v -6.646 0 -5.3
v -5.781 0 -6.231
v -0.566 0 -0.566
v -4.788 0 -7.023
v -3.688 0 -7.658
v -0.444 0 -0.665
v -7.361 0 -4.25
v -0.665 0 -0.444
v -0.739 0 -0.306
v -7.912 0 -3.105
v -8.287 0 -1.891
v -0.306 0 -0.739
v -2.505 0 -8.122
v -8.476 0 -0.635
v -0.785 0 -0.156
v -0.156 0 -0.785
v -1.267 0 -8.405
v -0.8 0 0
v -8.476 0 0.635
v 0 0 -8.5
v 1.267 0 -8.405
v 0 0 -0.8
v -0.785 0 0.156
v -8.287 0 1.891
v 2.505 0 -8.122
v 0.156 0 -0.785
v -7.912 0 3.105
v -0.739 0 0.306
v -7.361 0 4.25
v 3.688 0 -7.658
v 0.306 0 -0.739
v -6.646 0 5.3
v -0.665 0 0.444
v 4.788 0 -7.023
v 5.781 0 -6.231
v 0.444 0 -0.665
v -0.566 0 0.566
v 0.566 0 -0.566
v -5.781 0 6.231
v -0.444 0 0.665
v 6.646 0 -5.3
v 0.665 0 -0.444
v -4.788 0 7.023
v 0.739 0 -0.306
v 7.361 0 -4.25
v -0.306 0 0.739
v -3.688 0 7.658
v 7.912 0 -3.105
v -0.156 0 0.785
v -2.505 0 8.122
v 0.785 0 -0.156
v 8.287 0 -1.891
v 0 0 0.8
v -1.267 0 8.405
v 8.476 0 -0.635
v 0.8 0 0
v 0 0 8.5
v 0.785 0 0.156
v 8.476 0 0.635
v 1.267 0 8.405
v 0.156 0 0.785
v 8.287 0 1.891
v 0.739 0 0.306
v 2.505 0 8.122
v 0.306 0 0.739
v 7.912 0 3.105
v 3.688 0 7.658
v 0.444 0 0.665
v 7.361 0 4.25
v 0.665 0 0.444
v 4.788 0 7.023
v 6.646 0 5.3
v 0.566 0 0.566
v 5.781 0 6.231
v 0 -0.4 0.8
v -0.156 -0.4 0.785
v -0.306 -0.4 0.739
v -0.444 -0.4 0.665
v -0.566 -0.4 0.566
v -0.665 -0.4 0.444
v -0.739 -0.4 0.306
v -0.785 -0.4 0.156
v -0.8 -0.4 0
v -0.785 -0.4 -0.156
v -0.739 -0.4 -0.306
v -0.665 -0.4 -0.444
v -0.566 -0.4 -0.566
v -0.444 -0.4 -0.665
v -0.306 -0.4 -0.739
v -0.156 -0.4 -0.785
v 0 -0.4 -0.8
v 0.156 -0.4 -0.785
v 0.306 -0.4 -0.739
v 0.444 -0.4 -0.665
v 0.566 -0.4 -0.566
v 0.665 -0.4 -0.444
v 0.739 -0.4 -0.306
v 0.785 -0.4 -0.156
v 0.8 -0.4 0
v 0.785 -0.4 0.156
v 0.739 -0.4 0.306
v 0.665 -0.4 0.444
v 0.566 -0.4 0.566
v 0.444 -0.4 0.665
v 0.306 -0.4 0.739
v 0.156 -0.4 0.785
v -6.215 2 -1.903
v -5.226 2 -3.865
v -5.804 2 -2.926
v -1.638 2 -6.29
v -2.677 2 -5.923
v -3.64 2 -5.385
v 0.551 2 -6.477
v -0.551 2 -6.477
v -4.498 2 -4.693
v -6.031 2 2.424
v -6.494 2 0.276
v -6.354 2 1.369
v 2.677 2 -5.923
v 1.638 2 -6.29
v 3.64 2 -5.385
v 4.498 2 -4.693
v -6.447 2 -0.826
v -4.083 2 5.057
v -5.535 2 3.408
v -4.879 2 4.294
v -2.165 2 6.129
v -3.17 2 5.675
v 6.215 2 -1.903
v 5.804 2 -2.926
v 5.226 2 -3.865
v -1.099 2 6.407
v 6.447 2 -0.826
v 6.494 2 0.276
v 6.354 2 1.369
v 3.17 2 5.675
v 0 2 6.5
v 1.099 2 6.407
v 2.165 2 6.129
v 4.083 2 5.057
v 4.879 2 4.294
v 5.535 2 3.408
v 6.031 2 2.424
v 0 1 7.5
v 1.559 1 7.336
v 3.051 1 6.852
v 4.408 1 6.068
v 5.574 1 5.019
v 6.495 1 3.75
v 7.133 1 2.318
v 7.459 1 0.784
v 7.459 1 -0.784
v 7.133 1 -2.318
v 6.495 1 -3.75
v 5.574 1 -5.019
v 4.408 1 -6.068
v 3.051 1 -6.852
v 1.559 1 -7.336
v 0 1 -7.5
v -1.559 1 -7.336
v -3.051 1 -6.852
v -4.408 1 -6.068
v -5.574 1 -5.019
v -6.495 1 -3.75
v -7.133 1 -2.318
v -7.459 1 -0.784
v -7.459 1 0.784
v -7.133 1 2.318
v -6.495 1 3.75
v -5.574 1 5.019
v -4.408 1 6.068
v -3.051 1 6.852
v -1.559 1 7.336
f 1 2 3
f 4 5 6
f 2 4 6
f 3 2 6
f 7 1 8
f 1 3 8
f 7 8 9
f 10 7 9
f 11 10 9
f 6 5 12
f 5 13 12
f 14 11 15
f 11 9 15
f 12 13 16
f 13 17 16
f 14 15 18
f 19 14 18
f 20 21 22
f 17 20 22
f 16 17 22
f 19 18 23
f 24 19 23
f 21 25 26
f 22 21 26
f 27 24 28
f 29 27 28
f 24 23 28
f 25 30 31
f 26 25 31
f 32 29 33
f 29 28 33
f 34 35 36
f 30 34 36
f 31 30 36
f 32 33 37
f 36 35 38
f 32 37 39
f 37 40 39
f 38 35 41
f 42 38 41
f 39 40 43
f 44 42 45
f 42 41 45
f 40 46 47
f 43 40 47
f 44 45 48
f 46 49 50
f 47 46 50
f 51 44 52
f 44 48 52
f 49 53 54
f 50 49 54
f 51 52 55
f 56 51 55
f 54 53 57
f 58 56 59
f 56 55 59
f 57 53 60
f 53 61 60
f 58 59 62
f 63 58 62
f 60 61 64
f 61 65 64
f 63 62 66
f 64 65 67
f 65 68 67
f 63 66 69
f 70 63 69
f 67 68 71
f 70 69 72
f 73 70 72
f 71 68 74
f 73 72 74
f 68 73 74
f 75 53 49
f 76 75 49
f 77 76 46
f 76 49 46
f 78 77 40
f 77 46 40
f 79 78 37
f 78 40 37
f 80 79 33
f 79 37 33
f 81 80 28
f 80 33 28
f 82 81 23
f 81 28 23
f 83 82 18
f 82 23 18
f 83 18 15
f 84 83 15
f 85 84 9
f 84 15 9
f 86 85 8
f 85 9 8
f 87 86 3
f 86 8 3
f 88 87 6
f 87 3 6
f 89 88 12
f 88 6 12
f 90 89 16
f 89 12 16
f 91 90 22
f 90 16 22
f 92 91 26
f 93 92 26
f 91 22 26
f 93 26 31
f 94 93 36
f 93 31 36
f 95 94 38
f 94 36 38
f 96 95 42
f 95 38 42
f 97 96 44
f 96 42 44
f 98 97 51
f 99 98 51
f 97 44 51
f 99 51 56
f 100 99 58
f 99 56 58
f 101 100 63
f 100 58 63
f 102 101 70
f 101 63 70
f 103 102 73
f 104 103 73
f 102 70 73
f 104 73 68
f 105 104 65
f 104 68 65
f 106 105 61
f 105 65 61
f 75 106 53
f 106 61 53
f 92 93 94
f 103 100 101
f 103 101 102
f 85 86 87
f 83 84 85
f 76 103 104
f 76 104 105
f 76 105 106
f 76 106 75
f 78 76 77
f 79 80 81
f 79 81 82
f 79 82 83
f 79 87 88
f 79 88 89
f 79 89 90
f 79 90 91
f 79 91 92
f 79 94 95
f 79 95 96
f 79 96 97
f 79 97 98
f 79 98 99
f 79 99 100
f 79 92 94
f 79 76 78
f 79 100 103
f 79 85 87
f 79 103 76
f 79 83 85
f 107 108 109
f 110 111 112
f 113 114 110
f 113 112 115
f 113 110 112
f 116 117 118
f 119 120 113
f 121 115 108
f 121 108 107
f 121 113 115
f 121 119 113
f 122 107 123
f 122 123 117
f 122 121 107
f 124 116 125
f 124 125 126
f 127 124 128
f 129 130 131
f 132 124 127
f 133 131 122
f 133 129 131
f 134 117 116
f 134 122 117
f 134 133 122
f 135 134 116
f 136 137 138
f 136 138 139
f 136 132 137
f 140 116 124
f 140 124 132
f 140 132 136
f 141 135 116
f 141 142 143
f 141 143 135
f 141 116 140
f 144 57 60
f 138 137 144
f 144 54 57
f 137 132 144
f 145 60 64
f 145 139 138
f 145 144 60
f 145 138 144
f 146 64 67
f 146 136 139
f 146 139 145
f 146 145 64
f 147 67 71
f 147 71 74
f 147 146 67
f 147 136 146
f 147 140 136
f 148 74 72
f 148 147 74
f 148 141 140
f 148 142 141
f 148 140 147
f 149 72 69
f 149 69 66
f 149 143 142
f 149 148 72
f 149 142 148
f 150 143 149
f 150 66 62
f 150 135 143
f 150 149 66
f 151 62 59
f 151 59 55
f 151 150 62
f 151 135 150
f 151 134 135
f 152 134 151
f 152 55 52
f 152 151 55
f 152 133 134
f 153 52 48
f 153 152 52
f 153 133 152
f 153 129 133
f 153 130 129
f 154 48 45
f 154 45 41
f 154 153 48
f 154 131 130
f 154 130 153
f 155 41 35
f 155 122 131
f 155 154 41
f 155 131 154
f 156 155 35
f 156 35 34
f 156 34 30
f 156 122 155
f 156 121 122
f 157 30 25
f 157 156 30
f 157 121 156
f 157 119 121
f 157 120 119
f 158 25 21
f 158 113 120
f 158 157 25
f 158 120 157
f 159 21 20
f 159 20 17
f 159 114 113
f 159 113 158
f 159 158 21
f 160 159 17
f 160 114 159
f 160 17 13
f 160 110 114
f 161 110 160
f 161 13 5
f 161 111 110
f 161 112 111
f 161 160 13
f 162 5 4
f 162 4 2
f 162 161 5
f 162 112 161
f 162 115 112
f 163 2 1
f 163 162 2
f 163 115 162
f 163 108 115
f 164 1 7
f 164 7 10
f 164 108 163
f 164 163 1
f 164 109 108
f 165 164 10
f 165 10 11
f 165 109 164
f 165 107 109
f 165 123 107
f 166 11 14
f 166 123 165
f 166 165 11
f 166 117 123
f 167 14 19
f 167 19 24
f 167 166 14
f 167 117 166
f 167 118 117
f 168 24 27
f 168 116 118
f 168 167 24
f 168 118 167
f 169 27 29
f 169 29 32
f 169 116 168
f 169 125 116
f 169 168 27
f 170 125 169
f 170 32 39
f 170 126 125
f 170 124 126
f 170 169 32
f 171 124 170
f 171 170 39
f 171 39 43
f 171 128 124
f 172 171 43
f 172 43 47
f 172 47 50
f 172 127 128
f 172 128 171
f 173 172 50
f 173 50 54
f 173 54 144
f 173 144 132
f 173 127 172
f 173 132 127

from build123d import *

# Parameters (mm, degrees)
SKETCH1_R           = 8.5
BOSS_EXTRUDE1_DEPTH = 2
CHAMFER1_SIZE       = 2
SKETCH2_R           = 0.8
BOSS_EXTRUDE2_DEPTH = 0.4


with BuildPart() as part:
    # Sketch1 → Boss-Extrude1 (new body)
    with BuildSketch(Plane(origin=(0, 0, 0), x_dir=(1, 0, 0), z_dir=(0, 1, 0))):
        with Locations(Location((0, 0, 0), (0, 0, 270))):
            Circle(SKETCH1_R)
    extrude(amount=BOSS_EXTRUDE1_DEPTH)

    # Chamfer1
    chamfer1_edges = [part.edges().sort_by_distance(p)[0] for p in [
        (0, 2, -8.5),
    ]]
    chamfer(chamfer1_edges, length=CHAMFER1_SIZE - 0.0001)  # a hair under: the kernel refuses the full size

    # Sketch2 → Boss-Extrude2 (add)
    with BuildSketch(Plane(origin=(0, 0, 0), x_dir=(-1, 0, 0), z_dir=(0, -1, 0))):
        with Locations(Location((0, 0, 0), (0, 0, 270))):
            Circle(SKETCH2_R)
    extrude(amount=BOSS_EXTRUDE2_DEPTH)


solid = part.part
